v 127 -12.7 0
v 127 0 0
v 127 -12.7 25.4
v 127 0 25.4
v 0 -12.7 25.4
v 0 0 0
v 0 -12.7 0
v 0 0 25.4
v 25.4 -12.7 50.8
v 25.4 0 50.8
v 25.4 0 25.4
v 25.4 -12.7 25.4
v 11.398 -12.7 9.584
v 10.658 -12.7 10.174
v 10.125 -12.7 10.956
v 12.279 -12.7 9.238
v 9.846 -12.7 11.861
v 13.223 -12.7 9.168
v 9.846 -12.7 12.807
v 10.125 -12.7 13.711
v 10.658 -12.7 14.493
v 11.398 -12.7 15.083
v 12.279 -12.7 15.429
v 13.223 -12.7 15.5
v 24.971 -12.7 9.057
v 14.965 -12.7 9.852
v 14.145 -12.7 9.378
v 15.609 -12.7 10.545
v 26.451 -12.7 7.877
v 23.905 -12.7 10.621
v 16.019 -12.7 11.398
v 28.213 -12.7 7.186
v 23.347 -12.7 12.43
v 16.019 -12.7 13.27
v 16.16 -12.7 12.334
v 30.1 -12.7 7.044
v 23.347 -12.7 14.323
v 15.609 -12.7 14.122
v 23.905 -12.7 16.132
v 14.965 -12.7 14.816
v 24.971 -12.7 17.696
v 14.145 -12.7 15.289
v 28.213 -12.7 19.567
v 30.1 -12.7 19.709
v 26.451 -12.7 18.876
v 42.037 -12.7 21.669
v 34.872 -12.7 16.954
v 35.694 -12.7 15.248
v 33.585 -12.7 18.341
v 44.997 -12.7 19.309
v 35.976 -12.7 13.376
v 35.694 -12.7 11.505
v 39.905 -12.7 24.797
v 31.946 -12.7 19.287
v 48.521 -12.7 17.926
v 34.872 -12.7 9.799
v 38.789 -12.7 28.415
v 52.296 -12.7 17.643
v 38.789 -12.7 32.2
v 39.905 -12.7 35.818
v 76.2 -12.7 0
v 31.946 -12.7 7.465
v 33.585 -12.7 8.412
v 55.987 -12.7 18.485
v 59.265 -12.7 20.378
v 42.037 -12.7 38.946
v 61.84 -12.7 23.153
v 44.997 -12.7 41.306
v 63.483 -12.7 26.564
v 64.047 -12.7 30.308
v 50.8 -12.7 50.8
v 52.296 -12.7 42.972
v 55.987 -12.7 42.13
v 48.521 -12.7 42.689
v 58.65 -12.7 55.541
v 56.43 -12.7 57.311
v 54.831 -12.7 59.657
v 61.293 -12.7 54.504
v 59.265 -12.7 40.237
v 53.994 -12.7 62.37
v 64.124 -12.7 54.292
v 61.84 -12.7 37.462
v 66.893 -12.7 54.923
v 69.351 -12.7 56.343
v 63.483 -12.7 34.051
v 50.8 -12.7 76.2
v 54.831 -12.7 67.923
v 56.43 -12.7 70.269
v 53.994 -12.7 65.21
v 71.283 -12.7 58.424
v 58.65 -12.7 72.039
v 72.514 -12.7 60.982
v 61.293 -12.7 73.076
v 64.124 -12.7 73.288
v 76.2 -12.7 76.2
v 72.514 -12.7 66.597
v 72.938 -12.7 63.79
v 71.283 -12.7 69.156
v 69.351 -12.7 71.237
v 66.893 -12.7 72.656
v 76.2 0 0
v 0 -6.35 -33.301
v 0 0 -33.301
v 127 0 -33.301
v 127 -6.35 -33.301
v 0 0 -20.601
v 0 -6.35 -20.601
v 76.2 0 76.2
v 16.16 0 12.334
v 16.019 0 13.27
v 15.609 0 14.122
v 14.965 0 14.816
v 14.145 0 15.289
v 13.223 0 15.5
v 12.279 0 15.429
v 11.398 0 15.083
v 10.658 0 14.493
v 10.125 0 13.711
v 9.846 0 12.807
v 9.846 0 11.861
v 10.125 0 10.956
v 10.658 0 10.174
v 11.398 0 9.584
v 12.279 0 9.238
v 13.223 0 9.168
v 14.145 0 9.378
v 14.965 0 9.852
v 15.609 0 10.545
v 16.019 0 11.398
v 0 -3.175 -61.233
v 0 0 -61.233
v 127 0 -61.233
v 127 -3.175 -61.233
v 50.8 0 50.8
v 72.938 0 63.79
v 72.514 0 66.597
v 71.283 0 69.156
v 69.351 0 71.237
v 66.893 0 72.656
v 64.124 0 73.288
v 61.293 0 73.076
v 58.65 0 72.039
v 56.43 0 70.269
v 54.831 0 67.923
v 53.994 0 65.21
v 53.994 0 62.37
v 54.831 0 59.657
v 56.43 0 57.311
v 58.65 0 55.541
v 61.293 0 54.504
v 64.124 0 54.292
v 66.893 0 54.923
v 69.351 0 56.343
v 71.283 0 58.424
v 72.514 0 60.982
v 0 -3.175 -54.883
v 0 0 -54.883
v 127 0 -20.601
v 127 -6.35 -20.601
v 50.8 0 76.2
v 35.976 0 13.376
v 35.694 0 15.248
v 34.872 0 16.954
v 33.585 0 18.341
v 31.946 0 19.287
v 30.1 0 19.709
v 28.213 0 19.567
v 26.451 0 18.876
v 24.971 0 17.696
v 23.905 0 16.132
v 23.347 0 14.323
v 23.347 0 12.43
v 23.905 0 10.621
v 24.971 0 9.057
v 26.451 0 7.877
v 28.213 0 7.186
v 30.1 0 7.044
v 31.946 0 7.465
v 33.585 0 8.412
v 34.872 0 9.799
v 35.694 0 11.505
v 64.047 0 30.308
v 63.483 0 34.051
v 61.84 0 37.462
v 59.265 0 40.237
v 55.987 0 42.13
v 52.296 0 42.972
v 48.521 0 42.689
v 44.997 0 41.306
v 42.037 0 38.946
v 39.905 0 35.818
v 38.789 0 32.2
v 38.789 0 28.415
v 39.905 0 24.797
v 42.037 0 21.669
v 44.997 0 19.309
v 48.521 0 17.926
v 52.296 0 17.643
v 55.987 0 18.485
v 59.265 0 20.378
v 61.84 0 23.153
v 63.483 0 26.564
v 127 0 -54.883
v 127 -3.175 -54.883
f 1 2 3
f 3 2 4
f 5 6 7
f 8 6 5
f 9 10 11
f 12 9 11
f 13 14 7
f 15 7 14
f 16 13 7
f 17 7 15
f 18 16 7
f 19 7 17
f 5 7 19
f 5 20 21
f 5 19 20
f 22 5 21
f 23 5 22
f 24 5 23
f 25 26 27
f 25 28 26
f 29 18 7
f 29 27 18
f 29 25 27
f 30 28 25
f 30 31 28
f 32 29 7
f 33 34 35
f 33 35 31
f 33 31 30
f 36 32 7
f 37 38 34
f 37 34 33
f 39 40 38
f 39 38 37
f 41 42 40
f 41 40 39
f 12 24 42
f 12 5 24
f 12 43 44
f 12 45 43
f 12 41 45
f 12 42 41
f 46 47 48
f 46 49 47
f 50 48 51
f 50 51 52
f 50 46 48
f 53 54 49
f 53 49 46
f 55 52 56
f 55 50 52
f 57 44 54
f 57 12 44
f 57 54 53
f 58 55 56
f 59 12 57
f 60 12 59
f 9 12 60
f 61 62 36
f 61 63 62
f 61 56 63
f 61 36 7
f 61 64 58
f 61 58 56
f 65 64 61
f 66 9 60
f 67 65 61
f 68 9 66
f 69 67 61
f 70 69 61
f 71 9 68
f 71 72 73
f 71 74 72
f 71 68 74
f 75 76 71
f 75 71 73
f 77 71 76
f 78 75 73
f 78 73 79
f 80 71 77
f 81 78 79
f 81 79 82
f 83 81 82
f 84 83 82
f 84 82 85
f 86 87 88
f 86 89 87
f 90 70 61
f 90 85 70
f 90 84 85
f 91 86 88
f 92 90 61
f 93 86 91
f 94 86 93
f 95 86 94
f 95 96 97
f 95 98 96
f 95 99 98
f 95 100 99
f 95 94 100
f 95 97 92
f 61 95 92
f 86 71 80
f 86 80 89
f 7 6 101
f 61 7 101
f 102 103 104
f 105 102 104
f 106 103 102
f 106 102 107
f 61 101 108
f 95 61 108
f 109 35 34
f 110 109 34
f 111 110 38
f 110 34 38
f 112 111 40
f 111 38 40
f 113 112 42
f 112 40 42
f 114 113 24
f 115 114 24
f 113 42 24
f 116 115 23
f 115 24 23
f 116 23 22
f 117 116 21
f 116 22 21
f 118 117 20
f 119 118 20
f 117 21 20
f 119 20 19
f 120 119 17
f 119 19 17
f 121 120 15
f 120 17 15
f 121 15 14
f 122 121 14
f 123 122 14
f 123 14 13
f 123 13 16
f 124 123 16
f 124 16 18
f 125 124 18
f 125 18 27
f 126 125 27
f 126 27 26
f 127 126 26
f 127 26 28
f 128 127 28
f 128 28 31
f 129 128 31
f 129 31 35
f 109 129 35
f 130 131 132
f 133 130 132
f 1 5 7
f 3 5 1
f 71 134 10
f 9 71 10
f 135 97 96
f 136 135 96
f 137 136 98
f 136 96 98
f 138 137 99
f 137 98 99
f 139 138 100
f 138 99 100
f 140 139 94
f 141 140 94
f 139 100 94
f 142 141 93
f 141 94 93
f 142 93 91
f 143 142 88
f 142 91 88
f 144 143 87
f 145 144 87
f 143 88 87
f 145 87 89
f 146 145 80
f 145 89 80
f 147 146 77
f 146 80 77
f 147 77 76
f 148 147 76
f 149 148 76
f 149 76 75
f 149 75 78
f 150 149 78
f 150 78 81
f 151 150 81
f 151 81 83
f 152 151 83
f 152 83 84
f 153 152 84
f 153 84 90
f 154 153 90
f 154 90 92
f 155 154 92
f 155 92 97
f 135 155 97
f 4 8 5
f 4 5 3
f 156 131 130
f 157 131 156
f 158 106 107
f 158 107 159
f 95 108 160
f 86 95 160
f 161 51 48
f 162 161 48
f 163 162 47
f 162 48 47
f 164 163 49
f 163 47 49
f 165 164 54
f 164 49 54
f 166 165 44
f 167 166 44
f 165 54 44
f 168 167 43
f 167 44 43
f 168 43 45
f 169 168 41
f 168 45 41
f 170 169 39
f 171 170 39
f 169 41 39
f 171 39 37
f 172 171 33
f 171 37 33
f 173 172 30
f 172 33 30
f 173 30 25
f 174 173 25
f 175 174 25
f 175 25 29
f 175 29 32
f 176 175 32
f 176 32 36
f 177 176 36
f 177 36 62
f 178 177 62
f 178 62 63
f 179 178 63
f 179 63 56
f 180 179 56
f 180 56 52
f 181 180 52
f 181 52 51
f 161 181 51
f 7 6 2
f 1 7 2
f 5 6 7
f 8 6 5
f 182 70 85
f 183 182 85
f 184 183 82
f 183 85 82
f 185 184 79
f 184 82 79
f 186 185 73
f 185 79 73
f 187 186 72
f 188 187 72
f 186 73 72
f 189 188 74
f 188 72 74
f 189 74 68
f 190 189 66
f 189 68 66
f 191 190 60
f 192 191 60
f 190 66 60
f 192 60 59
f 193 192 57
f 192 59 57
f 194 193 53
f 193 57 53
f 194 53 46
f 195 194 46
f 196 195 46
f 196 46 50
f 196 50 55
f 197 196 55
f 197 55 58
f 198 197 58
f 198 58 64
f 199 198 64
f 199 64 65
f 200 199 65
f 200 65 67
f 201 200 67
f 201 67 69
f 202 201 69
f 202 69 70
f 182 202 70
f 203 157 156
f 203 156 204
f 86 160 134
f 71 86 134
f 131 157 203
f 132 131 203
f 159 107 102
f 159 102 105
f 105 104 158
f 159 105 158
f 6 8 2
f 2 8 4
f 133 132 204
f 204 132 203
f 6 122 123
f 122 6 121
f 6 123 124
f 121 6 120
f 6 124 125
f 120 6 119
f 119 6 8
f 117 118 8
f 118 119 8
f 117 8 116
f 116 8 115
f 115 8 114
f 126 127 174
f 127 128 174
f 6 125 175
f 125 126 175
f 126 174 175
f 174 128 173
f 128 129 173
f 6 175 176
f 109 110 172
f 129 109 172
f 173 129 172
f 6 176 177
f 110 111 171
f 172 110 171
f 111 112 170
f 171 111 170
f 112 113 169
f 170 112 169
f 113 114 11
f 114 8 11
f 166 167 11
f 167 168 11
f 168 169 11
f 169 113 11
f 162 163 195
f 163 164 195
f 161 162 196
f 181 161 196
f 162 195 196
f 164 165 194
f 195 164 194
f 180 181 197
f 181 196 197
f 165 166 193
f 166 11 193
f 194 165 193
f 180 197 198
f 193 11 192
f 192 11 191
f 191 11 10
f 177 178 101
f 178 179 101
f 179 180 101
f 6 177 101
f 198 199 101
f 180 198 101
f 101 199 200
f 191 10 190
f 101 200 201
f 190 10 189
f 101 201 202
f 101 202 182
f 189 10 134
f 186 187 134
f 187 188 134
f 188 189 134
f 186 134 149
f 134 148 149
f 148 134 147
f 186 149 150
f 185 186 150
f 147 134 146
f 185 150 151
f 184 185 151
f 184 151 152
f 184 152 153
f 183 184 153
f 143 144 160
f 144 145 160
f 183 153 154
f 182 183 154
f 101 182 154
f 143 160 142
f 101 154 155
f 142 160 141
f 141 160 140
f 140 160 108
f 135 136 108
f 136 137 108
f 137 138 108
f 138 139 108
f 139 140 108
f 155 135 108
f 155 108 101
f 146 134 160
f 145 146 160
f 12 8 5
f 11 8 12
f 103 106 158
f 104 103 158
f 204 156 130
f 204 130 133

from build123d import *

# Parameters (mm, degrees)
F0_W     = 25.4
F0_H     = 25.4
F1_DEPTH = 12.7
F2_R     = 3.175
F2_R_2   = 6.35
F2_R_3   = 9.525
F2_R_4   = 12.7
F3_DEPTH = 170.688
F4_W     = 127
F4_H     = 25.4
F5_DEPTH = 12.7
F4_H_2   = 12.7
F6_DEPTH = 6.35
F4_H_3   = 6.35
F7_DEPTH = 3.175


# Not quite as in the source:
# - a feature of the source that left no trace in its solid (it failed there, or was rolled back) is left out


with BuildPart() as f1:
    # F0 (on Front) → F1 (new body)
    with BuildSketch(Plane.XZ):
        with Locations((12.7, 12.7)):
            Rectangle(F0_W, F0_H)
        Polygon((25.4, 25.4), (25.4, 0), (50.8, 0), (50.8, 50.8), (25.4, 50.8), align=None)
        Polygon((50.8, 50.8), (50.8, 0), (76.2, 0), (76.2, 76.2), (50.8, 76.2), align=None)
    extrude(amount=F1_DEPTH)

    # F2 (on face) → F3 (cut)
    with BuildSketch(Plane.XZ.offset(12.7)):
        with Locations((12.9853840917, 12.3338634148)):
            Circle(F2_R)
        with Locations((29.6258646995, 13.3764185011)):
            Circle(F2_R_2)
        with Locations((63.4126663208, 63.7898892164)):
            Circle(F2_R_3)
        with Locations((51.3470545411, 30.3075592965)):
            Circle(F2_R_4)
    extrude(amount=-F3_DEPTH, mode=Mode.SUBTRACT)


with BuildPart() as f5:
    # F4 (on Front) → F5 (new body)
    with BuildSketch(Plane.XZ):
        with Locations((63.5, 12.7)):
            Rectangle(F4_W, F4_H)
    extrude(amount=F5_DEPTH)


with BuildPart() as f6:
    # F4 (on Front) → F6 (new body)
    with BuildSketch(Plane.XZ):
        with Locations((63.5, -26.9509138703)):
            Rectangle(F4_W, F4_H_2)
    extrude(amount=F6_DEPTH)


with BuildPart() as f7:
    # F4 (on Front) → F7 (new body)
    with BuildSketch(Plane.XZ):
        with Locations((63.5, -58.057842505)):
            Rectangle(F4_W, F4_H_3)
    extrude(amount=F7_DEPTH)


solid = Compound([f1.part, f5.part, f6.part, f7.part])
